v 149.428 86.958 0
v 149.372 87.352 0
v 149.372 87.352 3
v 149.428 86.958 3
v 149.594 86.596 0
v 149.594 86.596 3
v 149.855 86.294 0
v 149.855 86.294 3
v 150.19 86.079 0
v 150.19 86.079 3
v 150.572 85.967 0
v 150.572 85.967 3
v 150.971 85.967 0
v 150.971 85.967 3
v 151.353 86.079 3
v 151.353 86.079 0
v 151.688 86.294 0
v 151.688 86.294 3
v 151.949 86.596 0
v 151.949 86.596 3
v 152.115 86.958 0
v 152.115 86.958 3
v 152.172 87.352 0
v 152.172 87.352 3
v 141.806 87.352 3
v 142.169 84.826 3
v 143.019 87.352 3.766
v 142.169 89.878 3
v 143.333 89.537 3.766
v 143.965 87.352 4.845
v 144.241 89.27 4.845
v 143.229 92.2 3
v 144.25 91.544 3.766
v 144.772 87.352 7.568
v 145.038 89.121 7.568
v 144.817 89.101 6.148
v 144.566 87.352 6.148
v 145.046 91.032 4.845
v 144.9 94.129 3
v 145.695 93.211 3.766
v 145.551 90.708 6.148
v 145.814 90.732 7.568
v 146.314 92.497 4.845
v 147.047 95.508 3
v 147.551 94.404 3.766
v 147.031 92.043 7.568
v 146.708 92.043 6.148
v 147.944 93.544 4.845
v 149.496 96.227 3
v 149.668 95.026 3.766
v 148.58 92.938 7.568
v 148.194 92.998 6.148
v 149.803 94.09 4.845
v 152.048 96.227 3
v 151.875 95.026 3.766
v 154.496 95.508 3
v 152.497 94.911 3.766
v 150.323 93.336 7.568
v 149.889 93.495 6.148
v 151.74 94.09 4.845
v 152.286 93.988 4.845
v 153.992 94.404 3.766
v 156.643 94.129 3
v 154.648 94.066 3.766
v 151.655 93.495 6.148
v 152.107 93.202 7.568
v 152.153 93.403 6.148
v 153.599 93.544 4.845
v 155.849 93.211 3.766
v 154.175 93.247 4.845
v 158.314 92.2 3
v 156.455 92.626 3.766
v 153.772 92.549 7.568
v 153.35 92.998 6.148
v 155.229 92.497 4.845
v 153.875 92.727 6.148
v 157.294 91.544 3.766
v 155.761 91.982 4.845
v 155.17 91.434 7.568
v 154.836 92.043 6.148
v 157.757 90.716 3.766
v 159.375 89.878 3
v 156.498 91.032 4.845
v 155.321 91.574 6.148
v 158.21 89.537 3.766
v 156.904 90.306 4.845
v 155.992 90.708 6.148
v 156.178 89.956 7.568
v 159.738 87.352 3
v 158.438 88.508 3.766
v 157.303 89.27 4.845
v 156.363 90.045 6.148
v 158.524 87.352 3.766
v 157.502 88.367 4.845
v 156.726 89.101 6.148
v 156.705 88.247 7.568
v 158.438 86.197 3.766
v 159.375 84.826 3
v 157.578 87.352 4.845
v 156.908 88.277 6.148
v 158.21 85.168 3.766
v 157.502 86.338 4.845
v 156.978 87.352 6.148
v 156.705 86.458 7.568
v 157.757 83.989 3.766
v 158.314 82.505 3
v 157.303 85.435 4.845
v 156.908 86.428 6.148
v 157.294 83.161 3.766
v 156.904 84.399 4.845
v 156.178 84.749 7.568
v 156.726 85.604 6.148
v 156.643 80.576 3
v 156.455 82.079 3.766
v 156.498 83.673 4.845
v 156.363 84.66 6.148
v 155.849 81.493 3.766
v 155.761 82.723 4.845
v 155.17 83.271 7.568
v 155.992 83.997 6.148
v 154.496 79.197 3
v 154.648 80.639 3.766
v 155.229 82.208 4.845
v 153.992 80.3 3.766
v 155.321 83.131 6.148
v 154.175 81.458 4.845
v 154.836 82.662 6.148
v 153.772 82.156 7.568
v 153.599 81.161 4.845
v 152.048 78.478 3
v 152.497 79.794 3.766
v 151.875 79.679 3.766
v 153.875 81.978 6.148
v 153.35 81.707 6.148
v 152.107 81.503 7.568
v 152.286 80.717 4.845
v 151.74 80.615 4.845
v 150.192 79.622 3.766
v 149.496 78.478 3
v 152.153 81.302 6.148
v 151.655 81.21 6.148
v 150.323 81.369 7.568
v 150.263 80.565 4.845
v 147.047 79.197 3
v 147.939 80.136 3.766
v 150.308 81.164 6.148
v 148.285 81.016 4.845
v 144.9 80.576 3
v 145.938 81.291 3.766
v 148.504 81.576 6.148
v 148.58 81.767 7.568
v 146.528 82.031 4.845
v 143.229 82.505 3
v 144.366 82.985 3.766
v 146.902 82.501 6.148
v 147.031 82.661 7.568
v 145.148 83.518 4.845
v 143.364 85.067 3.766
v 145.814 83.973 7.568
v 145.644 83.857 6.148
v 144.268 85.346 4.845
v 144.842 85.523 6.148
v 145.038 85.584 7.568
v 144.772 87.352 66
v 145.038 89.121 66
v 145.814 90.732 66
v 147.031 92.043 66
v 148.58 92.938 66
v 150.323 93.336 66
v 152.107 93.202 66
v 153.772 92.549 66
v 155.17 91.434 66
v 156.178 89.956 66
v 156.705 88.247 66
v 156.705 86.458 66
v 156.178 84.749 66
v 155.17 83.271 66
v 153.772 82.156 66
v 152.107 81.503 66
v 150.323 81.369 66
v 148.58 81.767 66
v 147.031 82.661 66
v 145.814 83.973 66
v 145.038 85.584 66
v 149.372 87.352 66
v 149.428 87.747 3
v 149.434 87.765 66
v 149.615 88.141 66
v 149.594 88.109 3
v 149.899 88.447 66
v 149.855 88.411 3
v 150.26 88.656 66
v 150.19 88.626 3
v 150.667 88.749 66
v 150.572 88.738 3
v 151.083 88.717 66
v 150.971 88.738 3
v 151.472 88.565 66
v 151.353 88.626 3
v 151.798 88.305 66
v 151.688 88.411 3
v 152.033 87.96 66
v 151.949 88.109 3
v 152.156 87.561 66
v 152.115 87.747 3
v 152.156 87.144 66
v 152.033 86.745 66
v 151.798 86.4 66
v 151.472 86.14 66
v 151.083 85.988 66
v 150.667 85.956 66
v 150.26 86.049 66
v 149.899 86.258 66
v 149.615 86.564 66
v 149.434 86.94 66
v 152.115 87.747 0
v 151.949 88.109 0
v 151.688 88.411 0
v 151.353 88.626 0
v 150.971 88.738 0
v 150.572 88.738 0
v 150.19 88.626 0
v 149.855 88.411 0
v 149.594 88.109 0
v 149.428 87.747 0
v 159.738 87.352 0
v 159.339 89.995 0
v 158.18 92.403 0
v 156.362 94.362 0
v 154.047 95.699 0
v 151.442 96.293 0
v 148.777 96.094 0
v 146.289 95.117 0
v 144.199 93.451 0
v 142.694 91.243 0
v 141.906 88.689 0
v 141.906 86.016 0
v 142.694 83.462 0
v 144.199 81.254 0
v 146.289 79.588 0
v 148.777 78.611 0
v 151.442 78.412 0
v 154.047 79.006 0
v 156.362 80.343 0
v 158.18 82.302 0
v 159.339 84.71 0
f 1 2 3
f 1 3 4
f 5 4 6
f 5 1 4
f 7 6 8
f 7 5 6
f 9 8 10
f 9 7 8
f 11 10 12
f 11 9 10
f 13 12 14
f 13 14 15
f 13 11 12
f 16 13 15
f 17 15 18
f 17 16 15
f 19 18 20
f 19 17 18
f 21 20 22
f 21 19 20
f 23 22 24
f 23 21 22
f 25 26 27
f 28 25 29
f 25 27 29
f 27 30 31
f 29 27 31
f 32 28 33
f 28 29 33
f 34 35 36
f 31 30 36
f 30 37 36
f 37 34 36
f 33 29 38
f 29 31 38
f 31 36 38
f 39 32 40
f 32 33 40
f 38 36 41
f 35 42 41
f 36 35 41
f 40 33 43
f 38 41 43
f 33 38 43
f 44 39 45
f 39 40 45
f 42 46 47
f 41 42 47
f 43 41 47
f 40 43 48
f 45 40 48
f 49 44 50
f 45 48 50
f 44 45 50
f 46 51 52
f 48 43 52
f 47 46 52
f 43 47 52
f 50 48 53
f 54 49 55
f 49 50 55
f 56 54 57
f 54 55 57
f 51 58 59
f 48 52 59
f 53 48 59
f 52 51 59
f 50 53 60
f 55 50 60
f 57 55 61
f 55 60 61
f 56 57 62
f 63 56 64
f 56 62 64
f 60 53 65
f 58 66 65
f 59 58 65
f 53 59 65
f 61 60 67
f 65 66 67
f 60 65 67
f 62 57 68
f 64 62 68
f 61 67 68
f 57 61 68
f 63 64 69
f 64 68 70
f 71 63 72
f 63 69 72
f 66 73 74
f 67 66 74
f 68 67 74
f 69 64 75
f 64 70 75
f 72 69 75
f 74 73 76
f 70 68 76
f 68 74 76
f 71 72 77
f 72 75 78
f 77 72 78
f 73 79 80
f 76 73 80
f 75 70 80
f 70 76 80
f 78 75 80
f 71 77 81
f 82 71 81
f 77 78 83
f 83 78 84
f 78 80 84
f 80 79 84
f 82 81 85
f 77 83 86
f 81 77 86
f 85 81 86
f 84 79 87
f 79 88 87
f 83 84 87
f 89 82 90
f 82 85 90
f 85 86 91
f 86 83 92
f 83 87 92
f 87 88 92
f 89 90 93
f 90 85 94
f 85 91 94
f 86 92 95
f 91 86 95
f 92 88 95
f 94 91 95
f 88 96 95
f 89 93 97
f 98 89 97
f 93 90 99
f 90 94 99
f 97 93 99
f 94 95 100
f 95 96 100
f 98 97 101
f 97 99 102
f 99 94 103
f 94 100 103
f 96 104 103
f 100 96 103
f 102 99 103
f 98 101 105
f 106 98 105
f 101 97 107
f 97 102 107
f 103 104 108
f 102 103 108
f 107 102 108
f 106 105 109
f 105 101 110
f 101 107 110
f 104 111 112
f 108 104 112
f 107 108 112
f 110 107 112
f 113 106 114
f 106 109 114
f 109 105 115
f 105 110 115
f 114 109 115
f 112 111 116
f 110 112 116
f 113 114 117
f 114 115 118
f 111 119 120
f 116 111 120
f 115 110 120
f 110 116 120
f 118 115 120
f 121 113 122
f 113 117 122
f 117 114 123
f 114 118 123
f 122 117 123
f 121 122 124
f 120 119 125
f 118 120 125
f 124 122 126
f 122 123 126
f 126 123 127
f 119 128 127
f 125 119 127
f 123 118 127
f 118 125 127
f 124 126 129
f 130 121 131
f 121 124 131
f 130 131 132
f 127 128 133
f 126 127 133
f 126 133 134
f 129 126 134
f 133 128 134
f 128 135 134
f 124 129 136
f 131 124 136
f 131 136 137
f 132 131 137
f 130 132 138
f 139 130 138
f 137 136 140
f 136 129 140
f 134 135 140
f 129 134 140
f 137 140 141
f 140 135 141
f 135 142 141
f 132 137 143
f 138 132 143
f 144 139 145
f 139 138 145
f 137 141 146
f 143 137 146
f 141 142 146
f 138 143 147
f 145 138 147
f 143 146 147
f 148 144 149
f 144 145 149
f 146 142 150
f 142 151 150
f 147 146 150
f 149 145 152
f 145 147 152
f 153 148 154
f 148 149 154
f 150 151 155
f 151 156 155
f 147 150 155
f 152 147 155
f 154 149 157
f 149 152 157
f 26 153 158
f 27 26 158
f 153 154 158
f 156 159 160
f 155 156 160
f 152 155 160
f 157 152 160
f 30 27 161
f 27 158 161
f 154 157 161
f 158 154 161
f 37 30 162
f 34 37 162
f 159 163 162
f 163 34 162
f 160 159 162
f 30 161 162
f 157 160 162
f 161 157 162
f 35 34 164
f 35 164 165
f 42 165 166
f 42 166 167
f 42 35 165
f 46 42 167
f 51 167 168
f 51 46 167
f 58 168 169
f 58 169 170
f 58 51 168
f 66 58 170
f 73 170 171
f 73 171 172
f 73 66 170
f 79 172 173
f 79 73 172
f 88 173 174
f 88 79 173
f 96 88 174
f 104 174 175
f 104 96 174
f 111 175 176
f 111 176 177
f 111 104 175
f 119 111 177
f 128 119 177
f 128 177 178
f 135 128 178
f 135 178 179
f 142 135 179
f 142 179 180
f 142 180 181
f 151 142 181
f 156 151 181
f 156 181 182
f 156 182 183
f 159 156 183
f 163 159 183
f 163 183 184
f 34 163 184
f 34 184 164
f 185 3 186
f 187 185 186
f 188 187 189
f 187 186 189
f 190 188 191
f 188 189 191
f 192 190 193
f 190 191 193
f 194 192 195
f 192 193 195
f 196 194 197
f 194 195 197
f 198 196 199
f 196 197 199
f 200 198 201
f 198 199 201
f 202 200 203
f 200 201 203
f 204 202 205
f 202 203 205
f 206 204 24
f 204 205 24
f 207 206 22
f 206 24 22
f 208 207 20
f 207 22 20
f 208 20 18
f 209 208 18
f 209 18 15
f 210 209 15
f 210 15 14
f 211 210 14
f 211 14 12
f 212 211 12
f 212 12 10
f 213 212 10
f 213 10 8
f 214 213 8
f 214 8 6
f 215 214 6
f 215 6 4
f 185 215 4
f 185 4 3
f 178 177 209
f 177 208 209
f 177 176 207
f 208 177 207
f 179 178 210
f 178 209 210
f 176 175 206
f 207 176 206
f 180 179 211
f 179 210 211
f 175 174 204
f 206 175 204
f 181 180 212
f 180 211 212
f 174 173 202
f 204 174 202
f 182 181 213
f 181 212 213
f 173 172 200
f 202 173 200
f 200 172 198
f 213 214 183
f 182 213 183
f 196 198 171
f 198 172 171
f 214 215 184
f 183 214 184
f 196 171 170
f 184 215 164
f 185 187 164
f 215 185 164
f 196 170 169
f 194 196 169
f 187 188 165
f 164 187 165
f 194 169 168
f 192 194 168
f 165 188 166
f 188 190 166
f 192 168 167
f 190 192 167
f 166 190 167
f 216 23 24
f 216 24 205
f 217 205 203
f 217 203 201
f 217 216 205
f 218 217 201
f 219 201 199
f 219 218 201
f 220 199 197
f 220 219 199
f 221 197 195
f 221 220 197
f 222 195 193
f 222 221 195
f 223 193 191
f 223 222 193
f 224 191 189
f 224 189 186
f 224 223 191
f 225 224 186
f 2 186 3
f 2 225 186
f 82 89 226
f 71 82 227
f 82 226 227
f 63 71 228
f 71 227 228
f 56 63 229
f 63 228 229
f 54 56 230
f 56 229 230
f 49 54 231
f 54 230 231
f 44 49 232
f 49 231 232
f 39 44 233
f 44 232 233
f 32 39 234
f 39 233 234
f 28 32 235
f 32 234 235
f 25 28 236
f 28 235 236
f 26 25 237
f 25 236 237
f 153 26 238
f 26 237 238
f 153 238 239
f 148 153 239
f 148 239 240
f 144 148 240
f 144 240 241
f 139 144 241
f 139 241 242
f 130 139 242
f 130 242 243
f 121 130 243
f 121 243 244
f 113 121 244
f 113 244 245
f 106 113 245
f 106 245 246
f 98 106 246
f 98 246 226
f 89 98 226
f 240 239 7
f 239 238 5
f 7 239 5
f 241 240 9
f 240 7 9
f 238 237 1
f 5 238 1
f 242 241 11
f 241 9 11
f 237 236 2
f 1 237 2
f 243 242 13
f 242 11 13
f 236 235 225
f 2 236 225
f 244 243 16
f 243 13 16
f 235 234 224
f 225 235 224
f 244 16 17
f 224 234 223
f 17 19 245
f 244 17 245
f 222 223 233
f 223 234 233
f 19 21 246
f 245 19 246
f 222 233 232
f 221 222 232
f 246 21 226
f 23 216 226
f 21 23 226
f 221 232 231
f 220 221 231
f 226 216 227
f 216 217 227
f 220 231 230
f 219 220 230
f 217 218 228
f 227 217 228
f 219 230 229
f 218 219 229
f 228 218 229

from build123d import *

# Parameters (mm, degrees)
SKETCH_1_R      = 8.966016308
SKETCH_1_R_2    = 1.4
EXTRUDE_1_DEPTH = 3
SKETCH_2_R      = 6
SKETCH_2_R_2    = 1.4
EXTRUDE_2_DEPTH = 66
FILLET_1_R      = 5


with BuildPart() as part:
    # Эскиз1 → Бобышка-Вытянуть1 (new body)
    with BuildSketch(Plane.XY):
        with Locations((150.771693647, 87.352480595)):
            Circle(SKETCH_1_R)
        with Locations((150.771693647, 87.352480595)):
            Circle(SKETCH_1_R_2, mode=Mode.SUBTRACT)
    extrude(amount=EXTRUDE_1_DEPTH)

    # Эскиз2 → Бобышка-Вытянуть2 (add)
    with BuildSketch(Plane(origin=(0, 0, 0), x_dir=(-1, 0, 0), z_dir=(0, 0, -1))):
        with Locations((-150.771693647, 87.352480595)):
            Circle(SKETCH_2_R)
        with Locations((-150.771693647, 87.352480595)):
            Circle(SKETCH_2_R_2, mode=Mode.SUBTRACT)
    extrude(amount=-EXTRUDE_2_DEPTH)

    # Скругление1
    # the kernel refuses this fillet: 5 mm, written as the material it adds along each edge
    with BuildSketch(Plane(origin=(150.771693647, 87.352480595, 3), x_dir=(-1, 0, 0), z_dir=(0, -1, 0))) as fillet_1_piece_1:
        with BuildLine():
            CenterArc((11, -4.567593495), FILLET_1_R, 114.00376912, 65.99623088)
            Line((6, -4.567593495), (5.9, -4.567593495))
            Line((5.9, -4.567593495), (5.9, 0))
            Line((5.9, 0), (6, 0.1))
            ThreePointArc((6, 0.1), (7.483008154, 0.1), (8.925336634, 0.09135187))
            Line((8.925336634, 0.09135187), (8.966016308, 0))
        make_face()
    revolve(axis=Axis((150.771693647, 87.352480595, 3), (0, 0, -1)))


solid = part.part
